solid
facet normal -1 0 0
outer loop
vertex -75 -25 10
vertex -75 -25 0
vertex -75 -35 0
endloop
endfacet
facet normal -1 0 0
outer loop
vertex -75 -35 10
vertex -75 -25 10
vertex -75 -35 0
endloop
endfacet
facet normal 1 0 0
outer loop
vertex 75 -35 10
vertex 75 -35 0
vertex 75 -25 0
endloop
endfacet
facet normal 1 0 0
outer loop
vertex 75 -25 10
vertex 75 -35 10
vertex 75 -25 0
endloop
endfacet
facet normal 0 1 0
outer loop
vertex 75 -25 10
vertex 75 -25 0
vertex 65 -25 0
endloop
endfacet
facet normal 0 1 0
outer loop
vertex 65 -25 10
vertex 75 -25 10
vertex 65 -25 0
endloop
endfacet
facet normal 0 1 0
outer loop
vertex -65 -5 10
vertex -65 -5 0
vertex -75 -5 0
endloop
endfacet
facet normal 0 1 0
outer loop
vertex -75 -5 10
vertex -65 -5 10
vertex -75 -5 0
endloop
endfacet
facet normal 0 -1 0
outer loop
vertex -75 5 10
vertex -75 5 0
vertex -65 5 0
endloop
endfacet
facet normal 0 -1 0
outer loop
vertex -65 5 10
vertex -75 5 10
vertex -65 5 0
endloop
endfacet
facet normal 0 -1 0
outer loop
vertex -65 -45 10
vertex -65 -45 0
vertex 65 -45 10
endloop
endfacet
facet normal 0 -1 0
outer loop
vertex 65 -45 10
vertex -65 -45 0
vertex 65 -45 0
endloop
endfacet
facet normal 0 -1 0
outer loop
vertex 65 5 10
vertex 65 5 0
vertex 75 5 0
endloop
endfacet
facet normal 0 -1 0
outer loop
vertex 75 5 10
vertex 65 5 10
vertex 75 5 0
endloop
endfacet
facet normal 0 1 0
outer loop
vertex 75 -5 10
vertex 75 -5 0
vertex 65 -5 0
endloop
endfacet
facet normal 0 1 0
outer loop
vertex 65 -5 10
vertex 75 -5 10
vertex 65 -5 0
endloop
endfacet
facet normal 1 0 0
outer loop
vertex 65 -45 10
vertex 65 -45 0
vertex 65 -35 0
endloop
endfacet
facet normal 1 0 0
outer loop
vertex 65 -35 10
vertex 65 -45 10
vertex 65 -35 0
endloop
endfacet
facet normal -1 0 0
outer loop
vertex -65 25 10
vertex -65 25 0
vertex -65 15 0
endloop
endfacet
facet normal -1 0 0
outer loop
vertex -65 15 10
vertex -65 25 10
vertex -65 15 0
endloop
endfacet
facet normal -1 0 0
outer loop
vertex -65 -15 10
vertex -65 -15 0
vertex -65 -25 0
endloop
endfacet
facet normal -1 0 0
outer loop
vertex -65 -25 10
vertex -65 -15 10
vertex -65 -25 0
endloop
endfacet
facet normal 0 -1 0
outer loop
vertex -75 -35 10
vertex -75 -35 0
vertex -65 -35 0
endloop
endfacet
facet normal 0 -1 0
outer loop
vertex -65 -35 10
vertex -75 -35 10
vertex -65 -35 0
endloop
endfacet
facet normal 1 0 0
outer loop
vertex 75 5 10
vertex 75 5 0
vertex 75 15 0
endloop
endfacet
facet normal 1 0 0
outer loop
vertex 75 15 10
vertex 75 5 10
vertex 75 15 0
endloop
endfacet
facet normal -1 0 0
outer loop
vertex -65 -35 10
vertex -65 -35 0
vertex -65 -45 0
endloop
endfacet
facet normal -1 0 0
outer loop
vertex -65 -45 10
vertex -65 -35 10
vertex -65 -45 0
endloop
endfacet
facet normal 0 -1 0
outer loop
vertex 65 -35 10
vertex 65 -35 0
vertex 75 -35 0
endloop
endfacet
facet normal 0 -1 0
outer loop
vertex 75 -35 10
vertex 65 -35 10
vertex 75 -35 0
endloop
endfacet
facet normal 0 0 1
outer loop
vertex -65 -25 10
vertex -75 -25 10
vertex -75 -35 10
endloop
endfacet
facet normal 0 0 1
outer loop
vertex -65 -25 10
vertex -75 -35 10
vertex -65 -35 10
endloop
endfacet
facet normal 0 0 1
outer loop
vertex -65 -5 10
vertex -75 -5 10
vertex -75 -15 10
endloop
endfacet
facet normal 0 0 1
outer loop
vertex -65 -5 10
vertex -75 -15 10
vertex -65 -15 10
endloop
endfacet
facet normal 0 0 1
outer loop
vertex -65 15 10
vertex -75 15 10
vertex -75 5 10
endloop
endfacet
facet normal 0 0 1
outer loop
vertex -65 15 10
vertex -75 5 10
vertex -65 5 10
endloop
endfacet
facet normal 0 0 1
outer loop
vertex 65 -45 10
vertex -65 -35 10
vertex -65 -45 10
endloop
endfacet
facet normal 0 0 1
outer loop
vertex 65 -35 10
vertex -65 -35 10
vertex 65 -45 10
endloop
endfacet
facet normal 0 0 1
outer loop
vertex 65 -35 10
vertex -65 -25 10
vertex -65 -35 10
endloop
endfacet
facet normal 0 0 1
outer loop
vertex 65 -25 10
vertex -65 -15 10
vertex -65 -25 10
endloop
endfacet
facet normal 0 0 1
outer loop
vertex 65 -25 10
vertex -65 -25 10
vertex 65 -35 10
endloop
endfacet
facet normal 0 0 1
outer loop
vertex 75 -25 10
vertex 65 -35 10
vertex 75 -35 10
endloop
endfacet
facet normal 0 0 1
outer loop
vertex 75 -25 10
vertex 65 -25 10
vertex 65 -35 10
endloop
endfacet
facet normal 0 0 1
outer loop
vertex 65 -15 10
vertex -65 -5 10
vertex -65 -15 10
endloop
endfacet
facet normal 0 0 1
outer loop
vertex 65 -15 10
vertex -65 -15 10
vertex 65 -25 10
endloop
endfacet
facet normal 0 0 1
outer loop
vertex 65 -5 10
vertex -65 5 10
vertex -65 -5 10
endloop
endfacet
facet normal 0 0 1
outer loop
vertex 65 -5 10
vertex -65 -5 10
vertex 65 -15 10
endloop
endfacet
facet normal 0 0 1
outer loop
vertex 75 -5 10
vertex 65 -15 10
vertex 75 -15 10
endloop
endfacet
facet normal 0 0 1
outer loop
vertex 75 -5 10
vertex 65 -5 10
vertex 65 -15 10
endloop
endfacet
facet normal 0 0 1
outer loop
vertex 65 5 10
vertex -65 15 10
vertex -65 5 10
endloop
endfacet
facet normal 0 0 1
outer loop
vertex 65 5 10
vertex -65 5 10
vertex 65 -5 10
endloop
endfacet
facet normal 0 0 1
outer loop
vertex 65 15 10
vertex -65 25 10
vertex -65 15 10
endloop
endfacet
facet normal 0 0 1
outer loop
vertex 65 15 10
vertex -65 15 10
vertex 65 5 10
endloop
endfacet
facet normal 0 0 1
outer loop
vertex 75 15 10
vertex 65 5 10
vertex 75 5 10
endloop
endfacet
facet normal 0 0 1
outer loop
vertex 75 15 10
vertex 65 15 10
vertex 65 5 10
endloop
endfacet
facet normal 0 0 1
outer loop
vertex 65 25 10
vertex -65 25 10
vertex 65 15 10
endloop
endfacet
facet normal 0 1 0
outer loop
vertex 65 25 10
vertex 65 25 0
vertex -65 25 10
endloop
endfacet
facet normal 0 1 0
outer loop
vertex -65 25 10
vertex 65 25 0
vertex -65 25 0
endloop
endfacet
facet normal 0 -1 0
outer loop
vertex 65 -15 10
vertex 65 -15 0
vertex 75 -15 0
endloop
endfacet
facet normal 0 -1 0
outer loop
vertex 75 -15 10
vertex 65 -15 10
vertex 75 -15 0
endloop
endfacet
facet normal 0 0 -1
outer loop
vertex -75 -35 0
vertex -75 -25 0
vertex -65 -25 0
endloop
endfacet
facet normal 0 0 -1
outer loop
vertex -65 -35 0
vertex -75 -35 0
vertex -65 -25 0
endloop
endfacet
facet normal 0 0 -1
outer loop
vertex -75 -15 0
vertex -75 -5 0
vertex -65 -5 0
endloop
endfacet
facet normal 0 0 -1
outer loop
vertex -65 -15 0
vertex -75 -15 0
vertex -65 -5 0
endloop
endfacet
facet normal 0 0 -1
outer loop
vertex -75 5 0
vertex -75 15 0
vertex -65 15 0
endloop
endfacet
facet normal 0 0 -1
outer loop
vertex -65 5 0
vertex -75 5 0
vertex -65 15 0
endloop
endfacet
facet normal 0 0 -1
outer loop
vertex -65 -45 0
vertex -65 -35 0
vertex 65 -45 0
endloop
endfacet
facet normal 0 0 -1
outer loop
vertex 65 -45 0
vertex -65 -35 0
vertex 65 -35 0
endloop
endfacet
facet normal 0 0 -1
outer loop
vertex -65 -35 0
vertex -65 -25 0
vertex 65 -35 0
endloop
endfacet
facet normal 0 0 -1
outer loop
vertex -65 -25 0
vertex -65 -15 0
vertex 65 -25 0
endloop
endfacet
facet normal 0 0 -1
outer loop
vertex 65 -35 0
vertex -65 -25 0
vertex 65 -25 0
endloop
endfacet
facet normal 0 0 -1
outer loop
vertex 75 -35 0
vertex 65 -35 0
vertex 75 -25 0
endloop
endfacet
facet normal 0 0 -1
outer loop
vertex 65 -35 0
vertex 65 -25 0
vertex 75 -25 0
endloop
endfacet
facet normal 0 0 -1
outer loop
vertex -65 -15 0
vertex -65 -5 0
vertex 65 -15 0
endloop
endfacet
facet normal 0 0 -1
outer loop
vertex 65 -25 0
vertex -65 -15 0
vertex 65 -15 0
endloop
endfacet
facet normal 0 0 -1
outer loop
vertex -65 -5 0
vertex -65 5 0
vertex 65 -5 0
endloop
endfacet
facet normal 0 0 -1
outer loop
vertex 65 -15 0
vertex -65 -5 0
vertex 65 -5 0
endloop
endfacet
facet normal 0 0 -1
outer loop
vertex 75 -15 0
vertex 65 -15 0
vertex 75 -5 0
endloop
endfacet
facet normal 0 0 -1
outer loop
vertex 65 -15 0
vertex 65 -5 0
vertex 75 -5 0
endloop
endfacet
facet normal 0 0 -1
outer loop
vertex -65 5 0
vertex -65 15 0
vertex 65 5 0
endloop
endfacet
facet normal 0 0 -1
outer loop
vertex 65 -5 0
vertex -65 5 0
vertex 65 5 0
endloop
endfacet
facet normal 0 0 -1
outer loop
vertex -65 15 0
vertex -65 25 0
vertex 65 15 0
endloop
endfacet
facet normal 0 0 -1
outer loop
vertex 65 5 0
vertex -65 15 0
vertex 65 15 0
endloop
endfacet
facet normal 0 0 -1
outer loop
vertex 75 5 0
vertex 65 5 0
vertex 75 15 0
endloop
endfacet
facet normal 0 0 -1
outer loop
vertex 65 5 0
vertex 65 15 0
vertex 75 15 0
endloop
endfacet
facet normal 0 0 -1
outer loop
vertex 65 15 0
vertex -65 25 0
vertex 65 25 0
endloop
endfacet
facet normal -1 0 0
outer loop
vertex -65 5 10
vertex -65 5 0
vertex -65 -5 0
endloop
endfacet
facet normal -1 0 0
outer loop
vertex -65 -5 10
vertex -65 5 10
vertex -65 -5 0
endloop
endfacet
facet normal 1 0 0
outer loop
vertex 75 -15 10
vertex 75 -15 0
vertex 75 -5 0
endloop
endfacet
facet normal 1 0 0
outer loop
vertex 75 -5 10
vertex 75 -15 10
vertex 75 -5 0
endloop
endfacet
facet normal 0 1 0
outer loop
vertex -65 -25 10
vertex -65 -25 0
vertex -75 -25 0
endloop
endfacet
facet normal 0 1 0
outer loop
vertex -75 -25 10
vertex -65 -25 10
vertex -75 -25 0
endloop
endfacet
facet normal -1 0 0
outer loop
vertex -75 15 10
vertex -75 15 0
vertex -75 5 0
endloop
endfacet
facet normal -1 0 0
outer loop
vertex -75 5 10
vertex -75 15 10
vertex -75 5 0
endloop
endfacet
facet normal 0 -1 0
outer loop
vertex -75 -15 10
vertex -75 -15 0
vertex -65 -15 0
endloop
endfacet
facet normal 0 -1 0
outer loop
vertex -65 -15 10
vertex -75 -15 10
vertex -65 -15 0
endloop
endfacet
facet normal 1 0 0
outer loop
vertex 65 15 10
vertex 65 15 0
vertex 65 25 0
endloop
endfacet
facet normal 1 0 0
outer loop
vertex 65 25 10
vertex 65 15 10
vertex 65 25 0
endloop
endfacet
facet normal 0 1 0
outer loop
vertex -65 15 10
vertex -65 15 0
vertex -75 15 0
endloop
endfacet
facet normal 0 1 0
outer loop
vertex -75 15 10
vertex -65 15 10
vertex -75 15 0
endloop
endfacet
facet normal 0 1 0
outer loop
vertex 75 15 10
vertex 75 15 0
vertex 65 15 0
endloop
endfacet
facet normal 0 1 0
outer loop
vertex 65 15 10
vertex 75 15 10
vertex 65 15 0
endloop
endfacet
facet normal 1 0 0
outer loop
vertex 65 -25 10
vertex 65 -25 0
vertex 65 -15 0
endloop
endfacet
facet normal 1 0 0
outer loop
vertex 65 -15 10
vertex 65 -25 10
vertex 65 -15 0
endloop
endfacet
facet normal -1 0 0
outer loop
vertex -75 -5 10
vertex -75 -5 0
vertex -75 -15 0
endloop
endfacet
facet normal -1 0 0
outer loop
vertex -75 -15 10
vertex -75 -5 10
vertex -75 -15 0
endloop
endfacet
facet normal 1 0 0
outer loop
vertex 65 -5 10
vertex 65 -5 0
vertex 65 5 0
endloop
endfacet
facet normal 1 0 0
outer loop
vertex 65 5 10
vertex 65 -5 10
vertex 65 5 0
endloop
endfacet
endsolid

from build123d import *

# Parameters (mm, degrees)
F1_DEPTH = 10


with BuildPart() as f1:
    # F0 (on Top) → F1 (new body)
    with BuildSketch(Plane.XY):
        Polygon((0, -45), (65, -45), (65, -35), (75, -35), (75, -25), (65, -25), (65, -15), (75, -15), (75, -5), (65, -5), (65, 5), (75, 5), (75, 15), (65, 15), (65, 25), (-65, 25), (-65, 15), (-75, 15), (-75, 5), (-65, 5), (-65, -5), (-75, -5), (-75, -15), (-65, -15), (-65, -25), (-75, -25), (-75, -35), (-65, -35), (-65, -45), align=None)
    extrude(amount=F1_DEPTH)


solid = f1.part
